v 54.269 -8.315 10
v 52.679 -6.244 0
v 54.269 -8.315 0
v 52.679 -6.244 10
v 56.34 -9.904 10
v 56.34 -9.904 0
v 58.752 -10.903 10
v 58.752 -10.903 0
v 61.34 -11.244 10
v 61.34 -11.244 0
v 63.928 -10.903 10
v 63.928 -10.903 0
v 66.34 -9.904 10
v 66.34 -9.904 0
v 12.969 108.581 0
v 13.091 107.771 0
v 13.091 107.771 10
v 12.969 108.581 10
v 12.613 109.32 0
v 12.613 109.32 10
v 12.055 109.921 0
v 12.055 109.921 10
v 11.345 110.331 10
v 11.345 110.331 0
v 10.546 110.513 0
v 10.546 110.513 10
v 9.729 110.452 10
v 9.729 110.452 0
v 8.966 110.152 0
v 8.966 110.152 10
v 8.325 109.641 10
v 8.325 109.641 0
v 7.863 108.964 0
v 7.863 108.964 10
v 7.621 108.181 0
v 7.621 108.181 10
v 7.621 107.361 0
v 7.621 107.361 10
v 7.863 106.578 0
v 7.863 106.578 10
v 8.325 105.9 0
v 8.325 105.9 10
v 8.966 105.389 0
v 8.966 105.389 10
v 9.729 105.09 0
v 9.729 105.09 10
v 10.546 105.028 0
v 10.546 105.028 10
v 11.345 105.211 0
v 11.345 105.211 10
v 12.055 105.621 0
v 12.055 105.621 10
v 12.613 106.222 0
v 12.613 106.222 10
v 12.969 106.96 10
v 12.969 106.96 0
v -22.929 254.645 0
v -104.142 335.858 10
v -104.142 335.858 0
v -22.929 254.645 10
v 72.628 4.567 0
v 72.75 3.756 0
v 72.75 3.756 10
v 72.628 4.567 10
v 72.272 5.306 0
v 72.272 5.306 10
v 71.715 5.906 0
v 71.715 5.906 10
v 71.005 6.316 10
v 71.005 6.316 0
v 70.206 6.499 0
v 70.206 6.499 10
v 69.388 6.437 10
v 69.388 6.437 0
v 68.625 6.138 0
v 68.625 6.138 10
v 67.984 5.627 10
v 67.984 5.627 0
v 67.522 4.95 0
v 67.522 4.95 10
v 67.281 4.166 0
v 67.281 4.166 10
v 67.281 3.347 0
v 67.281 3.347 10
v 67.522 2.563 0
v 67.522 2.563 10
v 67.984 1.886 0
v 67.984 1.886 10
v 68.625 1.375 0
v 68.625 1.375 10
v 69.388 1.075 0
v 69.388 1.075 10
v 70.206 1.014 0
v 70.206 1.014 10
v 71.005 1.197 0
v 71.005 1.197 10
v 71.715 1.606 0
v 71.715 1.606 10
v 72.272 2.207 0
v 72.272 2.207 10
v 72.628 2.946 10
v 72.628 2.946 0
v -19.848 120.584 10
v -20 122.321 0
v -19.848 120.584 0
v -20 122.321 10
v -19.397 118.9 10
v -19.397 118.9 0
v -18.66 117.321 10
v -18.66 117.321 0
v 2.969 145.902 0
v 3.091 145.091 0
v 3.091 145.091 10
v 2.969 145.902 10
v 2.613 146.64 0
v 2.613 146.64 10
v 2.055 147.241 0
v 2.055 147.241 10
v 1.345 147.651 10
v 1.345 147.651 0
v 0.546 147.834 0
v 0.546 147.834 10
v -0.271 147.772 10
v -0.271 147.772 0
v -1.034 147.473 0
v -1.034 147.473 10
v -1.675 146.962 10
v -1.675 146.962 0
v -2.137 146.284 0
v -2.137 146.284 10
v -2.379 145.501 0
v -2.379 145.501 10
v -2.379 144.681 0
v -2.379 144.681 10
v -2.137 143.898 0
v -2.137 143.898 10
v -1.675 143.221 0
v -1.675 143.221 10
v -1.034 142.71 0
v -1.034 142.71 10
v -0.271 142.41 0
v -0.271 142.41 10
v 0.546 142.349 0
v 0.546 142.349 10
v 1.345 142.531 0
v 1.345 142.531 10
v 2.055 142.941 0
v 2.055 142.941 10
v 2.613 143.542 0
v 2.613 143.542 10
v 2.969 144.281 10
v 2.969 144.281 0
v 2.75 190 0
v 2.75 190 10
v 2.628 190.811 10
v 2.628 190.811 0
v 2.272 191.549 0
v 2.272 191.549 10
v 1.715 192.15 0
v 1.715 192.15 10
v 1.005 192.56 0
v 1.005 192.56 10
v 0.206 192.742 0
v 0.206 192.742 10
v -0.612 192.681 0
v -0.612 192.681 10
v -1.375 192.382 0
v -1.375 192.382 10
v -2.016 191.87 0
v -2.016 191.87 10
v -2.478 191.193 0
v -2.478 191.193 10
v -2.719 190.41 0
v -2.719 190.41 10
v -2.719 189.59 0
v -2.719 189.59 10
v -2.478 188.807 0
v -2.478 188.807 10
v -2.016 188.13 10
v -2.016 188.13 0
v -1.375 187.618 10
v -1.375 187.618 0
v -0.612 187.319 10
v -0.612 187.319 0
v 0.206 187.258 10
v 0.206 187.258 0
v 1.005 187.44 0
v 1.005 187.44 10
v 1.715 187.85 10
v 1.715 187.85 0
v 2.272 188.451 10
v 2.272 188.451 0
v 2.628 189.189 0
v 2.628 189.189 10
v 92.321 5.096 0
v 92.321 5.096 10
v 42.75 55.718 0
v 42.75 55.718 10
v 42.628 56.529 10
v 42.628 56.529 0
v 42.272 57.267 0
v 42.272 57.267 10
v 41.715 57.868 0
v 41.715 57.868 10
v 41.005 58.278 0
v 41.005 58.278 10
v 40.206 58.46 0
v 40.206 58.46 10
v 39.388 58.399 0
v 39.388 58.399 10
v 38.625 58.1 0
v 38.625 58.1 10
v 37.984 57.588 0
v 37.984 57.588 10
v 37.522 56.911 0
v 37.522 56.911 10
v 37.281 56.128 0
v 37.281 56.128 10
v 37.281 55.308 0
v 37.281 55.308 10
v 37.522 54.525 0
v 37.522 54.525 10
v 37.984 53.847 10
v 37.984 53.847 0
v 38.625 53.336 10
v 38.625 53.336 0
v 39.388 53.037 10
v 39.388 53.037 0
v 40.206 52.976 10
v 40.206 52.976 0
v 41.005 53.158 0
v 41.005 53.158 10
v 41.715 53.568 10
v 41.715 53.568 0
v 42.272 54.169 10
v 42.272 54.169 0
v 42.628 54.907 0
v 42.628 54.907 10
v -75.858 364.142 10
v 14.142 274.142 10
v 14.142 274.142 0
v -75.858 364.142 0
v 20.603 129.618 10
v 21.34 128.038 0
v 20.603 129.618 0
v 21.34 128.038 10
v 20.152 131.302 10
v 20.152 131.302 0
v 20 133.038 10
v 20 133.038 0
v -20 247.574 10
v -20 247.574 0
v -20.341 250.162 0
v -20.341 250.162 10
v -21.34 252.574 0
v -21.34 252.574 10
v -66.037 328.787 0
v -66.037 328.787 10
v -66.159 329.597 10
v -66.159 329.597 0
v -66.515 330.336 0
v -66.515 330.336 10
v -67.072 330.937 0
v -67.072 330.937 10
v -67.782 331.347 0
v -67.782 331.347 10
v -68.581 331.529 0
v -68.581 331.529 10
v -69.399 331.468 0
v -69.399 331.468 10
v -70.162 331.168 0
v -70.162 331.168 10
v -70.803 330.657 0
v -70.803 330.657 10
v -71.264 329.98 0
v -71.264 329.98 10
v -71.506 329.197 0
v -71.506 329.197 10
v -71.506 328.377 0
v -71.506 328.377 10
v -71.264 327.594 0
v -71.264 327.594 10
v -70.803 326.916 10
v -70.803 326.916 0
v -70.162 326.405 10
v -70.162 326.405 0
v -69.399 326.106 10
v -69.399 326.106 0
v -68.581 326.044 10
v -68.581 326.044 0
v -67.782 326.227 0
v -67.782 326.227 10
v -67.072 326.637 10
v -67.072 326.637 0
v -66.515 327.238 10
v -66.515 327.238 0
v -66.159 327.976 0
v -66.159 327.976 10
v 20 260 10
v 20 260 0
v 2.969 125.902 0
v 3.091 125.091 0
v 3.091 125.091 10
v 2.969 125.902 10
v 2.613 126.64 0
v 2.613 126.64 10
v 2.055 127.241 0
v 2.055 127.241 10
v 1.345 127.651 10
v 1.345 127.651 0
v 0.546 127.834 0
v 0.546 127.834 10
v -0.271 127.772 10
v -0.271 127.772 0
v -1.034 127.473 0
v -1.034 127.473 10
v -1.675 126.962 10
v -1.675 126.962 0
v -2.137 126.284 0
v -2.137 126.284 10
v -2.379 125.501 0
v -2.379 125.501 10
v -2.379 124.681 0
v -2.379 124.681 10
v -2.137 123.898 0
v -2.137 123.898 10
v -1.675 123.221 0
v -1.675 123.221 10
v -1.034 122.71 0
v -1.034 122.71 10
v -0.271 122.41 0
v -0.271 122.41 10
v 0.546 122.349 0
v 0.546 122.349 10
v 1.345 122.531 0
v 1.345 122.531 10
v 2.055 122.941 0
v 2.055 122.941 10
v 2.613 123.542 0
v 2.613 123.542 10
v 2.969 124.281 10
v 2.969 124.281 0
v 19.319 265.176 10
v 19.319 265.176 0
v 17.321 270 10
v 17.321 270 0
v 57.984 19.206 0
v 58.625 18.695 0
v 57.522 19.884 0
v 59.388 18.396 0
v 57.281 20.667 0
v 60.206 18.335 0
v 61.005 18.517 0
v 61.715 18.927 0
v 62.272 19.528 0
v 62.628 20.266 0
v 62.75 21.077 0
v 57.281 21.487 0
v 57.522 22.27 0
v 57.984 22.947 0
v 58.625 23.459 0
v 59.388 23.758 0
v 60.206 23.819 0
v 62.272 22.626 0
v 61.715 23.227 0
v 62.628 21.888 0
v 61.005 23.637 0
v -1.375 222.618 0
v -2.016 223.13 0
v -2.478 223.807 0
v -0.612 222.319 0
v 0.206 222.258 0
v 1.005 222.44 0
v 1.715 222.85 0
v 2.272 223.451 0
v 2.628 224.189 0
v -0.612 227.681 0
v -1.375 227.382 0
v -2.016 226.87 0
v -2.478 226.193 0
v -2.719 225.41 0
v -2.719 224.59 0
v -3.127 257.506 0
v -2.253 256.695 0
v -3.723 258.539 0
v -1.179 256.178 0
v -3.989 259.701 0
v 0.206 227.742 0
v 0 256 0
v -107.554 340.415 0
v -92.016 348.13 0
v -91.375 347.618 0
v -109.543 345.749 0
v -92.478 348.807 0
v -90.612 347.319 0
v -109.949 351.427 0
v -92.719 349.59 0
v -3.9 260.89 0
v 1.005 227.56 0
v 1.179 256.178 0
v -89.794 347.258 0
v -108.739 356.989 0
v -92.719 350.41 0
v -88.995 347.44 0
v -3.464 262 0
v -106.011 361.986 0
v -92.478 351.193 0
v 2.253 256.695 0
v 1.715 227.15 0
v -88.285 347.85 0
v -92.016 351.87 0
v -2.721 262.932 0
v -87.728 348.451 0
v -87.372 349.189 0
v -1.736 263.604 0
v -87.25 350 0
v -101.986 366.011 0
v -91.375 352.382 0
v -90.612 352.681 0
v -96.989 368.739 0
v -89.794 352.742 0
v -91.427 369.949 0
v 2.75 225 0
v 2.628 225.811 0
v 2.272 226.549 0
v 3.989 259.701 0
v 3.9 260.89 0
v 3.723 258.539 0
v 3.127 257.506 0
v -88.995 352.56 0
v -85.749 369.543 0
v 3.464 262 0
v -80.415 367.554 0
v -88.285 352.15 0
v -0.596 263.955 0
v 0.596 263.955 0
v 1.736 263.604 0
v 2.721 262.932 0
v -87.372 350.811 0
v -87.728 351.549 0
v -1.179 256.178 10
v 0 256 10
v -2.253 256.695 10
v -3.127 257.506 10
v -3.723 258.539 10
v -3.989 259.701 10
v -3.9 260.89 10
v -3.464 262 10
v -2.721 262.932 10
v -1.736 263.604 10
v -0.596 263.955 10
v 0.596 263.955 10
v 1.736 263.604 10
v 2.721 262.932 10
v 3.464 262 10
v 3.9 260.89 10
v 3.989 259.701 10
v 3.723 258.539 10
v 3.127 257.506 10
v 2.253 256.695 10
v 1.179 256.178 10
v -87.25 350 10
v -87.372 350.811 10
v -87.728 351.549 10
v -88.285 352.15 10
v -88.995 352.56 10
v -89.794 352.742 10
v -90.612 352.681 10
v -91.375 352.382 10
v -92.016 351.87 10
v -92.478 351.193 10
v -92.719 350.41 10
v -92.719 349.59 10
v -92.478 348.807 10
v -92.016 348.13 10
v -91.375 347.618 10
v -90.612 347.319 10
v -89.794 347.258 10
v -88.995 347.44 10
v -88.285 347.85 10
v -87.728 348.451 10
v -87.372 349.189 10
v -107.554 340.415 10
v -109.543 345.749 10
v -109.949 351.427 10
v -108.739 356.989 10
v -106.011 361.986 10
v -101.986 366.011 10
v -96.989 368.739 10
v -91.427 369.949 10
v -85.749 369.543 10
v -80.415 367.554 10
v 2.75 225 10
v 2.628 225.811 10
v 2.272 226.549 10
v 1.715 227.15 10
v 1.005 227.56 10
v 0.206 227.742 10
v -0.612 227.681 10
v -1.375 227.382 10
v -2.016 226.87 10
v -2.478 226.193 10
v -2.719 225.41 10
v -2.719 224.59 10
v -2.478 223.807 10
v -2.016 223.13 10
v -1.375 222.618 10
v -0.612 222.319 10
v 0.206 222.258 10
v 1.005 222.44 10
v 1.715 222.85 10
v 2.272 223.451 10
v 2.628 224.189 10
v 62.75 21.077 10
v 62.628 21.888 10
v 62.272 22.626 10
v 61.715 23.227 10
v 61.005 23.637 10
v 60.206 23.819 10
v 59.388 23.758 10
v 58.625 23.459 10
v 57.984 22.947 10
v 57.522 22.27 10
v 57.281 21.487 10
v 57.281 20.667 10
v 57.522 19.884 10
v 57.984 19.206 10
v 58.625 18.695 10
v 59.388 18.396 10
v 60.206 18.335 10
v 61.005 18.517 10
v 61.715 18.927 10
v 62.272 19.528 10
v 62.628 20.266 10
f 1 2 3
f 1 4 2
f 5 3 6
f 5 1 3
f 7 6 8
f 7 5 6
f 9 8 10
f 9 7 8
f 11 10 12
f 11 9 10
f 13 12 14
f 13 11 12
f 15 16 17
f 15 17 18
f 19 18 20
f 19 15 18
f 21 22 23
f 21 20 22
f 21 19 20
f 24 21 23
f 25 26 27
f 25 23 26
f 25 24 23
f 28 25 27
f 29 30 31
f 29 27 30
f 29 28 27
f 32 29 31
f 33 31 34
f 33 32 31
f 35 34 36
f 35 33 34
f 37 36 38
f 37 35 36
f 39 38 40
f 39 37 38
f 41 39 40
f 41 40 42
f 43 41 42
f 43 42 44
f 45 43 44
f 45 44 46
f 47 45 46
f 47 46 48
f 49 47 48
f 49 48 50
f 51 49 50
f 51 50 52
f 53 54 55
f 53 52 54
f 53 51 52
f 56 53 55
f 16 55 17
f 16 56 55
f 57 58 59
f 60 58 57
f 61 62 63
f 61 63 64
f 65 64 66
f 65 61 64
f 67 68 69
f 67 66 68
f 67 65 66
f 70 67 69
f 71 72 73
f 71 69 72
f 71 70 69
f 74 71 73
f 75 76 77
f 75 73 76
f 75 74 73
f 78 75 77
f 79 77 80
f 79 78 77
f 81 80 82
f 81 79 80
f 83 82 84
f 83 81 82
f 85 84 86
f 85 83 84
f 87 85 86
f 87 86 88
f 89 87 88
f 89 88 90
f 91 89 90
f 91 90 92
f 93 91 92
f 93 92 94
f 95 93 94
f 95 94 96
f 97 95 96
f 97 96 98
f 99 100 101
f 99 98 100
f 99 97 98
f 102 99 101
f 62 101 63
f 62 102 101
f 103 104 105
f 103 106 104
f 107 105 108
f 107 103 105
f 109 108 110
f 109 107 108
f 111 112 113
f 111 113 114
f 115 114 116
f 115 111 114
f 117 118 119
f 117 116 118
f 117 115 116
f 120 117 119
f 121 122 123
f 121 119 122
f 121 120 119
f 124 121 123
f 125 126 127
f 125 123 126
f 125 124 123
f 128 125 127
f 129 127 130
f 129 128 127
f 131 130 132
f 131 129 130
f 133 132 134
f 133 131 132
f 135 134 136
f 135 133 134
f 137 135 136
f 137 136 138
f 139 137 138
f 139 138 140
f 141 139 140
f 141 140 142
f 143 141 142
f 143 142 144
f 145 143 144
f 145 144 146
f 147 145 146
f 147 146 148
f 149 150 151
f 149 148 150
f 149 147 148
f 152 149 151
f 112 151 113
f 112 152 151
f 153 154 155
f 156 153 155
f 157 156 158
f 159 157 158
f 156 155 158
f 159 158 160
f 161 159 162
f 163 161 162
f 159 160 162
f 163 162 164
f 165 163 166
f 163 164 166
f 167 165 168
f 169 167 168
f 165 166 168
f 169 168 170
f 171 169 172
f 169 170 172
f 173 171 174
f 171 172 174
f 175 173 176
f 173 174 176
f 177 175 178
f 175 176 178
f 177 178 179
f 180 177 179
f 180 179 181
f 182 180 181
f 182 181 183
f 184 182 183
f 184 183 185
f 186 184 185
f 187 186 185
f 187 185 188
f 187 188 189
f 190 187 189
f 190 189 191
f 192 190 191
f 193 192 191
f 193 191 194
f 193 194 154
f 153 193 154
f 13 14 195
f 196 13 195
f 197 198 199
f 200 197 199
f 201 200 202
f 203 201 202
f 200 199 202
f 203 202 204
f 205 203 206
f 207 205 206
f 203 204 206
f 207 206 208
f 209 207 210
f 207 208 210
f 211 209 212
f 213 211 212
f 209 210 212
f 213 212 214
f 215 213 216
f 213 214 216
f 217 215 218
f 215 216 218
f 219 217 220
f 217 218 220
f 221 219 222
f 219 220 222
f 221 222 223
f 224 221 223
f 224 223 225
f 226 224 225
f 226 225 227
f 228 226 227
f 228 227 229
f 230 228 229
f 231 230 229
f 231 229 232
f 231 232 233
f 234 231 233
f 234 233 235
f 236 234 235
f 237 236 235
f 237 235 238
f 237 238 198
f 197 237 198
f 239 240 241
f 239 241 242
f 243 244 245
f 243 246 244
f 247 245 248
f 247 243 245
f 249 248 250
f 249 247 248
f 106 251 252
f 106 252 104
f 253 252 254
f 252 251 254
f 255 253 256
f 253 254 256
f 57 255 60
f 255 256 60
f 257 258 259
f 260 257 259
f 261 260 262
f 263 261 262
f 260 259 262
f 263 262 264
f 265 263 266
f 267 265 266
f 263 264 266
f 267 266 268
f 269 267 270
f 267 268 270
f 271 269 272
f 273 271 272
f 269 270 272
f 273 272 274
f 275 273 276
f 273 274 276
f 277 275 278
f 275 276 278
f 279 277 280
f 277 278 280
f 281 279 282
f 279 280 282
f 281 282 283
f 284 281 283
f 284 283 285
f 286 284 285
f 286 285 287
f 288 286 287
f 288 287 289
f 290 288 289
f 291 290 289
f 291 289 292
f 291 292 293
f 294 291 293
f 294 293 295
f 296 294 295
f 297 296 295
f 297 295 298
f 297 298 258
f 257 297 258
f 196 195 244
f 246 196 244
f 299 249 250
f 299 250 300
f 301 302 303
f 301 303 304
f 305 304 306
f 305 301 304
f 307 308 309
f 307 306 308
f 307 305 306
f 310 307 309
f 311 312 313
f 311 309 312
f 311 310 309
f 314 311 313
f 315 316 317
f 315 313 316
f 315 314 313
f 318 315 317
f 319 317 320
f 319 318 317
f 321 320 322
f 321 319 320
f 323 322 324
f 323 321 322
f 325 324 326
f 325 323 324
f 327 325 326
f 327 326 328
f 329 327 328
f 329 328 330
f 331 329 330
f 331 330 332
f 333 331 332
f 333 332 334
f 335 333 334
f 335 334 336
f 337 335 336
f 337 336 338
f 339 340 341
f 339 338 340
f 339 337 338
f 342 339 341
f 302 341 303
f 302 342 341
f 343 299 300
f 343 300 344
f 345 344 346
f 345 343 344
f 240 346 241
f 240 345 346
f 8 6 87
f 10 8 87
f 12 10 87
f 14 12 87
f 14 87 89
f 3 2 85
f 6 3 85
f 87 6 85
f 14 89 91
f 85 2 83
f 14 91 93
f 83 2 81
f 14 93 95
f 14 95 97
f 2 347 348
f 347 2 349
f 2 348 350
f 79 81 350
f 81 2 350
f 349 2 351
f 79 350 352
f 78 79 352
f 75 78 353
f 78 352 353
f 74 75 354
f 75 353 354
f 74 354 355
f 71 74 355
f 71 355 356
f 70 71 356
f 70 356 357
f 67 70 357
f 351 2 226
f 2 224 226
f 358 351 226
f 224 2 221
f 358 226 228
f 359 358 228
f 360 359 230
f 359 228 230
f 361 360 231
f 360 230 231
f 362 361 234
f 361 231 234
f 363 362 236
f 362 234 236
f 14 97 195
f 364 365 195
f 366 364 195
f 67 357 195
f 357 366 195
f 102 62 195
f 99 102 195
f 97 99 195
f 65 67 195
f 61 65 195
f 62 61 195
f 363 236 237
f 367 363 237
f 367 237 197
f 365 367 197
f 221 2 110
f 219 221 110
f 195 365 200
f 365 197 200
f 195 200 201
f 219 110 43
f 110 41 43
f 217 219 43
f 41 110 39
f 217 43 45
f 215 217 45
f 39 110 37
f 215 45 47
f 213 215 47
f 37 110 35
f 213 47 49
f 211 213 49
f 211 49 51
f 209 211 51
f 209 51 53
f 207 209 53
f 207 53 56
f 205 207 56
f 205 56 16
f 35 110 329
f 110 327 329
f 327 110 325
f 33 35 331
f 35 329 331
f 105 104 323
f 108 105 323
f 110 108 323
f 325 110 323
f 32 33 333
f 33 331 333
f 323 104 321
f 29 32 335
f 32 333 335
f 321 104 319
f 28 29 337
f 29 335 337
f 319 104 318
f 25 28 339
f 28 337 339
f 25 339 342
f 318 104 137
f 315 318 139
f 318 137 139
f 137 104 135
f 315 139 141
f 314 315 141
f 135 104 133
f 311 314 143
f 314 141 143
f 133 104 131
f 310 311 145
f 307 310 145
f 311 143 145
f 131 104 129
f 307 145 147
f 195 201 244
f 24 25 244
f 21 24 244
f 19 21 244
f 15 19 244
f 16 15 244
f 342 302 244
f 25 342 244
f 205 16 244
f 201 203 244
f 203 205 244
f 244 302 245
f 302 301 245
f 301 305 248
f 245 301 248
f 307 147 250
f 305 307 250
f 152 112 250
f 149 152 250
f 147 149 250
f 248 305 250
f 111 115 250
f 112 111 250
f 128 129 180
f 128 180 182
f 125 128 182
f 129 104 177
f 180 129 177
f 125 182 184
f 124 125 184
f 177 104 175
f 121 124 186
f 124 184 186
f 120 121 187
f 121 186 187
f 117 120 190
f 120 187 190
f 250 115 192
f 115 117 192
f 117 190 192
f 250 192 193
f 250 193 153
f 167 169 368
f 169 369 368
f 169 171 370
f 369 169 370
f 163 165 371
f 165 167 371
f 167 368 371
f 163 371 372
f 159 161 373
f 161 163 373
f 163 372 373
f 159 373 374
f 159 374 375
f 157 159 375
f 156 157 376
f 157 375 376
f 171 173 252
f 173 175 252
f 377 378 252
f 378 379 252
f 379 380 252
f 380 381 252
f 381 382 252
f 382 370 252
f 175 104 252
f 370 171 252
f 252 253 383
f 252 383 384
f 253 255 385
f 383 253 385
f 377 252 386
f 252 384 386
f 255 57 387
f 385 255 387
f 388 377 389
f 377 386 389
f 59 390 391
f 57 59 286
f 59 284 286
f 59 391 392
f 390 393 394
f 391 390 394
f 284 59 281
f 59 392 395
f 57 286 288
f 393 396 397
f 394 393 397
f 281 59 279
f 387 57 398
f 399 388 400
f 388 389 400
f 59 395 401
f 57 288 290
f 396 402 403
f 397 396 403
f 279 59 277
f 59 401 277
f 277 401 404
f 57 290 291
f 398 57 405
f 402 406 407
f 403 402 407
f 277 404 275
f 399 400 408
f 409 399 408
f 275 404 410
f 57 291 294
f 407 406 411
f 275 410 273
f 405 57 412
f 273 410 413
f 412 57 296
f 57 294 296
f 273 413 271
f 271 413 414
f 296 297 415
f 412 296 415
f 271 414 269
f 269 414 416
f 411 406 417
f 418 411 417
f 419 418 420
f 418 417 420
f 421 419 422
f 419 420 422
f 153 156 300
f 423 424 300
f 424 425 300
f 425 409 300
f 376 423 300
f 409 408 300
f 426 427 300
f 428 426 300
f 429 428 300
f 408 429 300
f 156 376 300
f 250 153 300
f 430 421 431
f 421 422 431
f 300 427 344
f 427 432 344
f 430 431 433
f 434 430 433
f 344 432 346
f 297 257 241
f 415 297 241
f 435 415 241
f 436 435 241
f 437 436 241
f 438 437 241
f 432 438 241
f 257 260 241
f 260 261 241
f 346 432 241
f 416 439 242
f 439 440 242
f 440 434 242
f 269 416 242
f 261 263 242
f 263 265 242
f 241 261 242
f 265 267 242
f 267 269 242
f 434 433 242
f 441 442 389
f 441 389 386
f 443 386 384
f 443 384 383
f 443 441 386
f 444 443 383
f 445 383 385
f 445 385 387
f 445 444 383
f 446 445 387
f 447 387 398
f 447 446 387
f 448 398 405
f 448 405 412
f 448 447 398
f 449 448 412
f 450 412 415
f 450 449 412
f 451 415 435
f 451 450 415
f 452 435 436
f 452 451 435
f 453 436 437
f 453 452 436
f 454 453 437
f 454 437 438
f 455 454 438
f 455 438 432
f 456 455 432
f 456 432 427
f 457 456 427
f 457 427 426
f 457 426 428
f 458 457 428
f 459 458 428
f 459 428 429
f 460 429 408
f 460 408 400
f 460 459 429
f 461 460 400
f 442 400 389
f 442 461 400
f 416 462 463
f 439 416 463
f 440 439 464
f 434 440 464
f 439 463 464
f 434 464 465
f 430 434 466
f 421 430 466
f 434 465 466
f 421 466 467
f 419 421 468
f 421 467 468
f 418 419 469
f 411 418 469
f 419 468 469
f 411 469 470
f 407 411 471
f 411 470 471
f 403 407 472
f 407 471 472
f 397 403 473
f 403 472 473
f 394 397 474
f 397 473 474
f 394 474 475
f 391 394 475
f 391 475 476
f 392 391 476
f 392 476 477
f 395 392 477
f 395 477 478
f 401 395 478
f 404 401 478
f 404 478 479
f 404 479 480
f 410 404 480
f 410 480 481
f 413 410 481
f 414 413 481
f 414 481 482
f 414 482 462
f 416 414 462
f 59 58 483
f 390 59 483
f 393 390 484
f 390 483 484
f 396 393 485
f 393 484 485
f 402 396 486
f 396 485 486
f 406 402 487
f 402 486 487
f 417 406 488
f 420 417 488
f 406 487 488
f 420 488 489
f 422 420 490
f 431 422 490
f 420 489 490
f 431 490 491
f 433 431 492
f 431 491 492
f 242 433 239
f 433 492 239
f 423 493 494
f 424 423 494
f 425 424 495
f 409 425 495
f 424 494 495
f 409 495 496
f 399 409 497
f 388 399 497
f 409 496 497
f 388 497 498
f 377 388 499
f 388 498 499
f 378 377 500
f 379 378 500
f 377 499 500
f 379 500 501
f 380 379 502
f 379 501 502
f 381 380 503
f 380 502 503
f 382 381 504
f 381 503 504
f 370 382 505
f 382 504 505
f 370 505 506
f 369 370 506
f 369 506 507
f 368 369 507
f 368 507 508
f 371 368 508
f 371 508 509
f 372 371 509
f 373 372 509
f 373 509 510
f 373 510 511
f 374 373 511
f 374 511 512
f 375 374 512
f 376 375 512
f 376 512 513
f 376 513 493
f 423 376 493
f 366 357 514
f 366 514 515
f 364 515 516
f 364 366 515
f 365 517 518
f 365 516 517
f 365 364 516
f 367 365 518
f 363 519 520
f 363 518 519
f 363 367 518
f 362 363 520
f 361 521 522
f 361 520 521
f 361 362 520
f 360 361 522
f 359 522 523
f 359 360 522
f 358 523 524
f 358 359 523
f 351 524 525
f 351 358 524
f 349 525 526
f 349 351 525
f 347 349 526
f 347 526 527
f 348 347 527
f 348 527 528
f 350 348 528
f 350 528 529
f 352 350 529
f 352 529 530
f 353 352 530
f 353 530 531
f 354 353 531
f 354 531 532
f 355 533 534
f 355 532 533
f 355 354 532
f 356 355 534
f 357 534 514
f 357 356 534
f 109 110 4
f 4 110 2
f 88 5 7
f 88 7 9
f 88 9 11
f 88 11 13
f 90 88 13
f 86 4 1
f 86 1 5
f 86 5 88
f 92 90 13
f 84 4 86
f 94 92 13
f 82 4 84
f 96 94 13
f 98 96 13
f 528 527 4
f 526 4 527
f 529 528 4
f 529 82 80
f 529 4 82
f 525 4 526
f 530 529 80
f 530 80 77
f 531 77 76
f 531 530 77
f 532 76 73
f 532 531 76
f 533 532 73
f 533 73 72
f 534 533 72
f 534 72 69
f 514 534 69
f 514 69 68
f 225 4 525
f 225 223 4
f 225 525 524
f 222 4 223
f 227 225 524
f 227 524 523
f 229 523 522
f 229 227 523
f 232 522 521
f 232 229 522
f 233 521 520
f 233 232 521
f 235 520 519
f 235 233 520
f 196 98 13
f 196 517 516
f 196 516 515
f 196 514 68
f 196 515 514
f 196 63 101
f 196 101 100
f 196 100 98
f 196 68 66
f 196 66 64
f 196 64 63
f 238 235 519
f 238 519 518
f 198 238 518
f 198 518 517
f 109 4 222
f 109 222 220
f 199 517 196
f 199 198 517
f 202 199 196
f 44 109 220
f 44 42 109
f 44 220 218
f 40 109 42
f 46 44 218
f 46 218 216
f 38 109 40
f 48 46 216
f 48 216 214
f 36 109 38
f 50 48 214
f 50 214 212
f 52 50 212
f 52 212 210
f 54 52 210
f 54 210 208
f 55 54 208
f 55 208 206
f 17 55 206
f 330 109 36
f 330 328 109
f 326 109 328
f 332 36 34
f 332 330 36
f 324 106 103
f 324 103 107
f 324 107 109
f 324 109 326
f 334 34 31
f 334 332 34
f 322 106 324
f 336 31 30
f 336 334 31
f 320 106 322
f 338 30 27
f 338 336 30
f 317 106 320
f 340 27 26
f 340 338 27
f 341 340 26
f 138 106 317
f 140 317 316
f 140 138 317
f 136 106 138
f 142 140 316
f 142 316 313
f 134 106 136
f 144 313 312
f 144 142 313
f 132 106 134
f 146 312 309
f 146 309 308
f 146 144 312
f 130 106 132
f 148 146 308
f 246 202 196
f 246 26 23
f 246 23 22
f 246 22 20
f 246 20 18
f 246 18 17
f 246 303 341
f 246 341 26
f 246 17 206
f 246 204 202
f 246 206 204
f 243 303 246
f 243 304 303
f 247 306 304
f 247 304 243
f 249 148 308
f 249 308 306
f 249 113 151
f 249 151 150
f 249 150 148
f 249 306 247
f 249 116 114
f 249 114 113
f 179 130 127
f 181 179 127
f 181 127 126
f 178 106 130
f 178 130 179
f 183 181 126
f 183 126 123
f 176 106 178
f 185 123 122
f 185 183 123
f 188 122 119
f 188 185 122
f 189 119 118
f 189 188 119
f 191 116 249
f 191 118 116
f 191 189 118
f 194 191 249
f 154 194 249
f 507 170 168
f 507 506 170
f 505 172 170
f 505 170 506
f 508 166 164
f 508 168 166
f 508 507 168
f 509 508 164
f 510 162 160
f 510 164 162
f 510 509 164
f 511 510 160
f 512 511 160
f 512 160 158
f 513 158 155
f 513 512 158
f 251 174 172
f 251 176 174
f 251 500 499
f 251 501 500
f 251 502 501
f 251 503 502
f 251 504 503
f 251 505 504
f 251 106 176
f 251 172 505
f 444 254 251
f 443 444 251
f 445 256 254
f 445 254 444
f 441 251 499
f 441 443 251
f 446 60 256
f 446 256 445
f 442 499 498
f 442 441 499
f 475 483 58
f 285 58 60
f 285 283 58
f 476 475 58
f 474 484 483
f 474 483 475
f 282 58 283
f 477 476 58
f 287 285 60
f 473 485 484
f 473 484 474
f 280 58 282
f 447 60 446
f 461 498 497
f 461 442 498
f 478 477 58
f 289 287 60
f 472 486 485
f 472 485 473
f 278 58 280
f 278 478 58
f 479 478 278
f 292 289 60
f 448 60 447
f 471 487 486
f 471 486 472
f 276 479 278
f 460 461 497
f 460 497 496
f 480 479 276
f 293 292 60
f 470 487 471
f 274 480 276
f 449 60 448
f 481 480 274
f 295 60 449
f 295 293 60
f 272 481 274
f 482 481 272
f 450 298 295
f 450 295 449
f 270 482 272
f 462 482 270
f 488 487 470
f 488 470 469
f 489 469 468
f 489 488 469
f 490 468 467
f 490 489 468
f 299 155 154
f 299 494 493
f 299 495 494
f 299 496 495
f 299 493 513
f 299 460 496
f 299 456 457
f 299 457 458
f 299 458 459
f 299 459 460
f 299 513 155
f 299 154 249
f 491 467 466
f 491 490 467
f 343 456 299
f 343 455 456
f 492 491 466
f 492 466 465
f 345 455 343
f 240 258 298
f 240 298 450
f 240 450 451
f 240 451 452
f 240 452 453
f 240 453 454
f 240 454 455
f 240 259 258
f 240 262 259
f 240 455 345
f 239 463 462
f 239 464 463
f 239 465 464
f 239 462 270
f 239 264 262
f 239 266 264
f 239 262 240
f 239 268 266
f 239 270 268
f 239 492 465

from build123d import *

# Parameters (mm, degrees)
BOSS_EXTRUDE1_DEPTH     = 10
FILLET1_R               = 10
BOSS_EXTRUDE2_DEPTH     = 10
SKETCH3_R               = 2.75
CUT_EXTRUDE1_DEPTH      = 295.996739323
CUT_EXTRUDE2_DEPTH      = 295.996739323
CUT_EXTRUDE2_DEPTH_BACK = 295.996739323
SKETCH5_R               = 2.75
BOSS_EXTRUDE3_DEPTH     = 10
FILLET2_R               = 10
CUT_EXTRUDE3_DEPTH      = 10
SKETCH9_R               = 2.75
CUT_EXTRUDE4_DEPTH      = 387.134691526
SKETCH10_R              = 2.75
CUT_EXTRUDE5_DEPTH      = 387.134691526
CUT_EXTRUDE6_DEPTH      = 387.134691526
CUT_EXTRUDE6_DEPTH_BACK = 387.134691526
SKETCH11_R              = 2.75


with BuildPart() as part:
    # Sketch1 → Boss-Extrude1 (new body)
    with BuildSketch(Plane.XY):
        Polygon((75, -4.903810568), (0, 125), (0, 250), (-20, 250), (-20, 119.641016151), (57.679491924, -14.903810568), align=None)
        Polygon((0, 250), (0, 125), (75, -4.903810568), (92.320508076, 5.096189432), (20, 130.358983849), (20, 250), align=None)
    extrude(amount=BOSS_EXTRUDE1_DEPTH)

    # Fillet1
    fillet1_edges = [part.edges().sort_by_distance(p)[0] for p in [
        (57.679491924, -14.903810568, 5),
        (-20, 119.641016151, 5),
        (20, 130.358983849, 5),
    ]]
    fillet(fillet1_edges, radius=FILLET1_R)

    # Sketch2 → Boss-Extrude2 (add)
    with BuildSketch(Plane.XY.offset(10)):
        with BuildLine():
            Line((0, 250), (20, 250))
            Line((20, 250), (20, 260))
            ThreePointArc((20, 260), (0, 280), (-20, 260))
            Line((-20, 260), (-20, 250))
            Line((-20, 250), (0, 250))
        make_face()
        with BuildLine():
            ThreePointArc((0, 264), (4, 260), (0, 256))
            ThreePointArc((0, 256), (-4, 260), (0, 264))
        make_face(mode=Mode.SUBTRACT)
    extrude(amount=-BOSS_EXTRUDE2_DEPTH)

    # Sketch3 → Cut-Extrude1 (cut, through all)
    with BuildSketch(Plane.XY.offset(10)):
        with Locations((0, 190)):
            Circle(SKETCH3_R)
        with Locations((0, 225)):
            Circle(SKETCH3_R)
    extrude(amount=-CUT_EXTRUDE1_DEPTH, mode=Mode.SUBTRACT)

    # Sketch5 → Cut-Extrude2 (cut, two sides: drawn at the far end of the back side and taken through both)
    with BuildSketch(Plane.XY.offset(10).offset(-CUT_EXTRUDE2_DEPTH_BACK)):
        with Locations((60, 21.076951546)):
            Circle(SKETCH5_R)
        with Locations((70, 3.75644347)):
            Circle(SKETCH5_R)
    extrude(amount=CUT_EXTRUDE2_DEPTH + CUT_EXTRUDE2_DEPTH_BACK, mode=Mode.SUBTRACT)

    # Sketch7 → Boss-Extrude3 (add)
    with BuildSketch(Plane.XY.offset(10)):
        with BuildLine():
            ThreePointArc((-14.142135624, 245.857864376), (-14.142135624, 274.142135624), (14.142135624, 274.142135624))
            Line((14.142135624, 274.142135624), (-105.857864376, 394.142135624))
            ThreePointArc((-105.857864376, 394.142135624), (-134.142135624, 394.142135624), (-134.142135624, 365.857864376))
            Line((-134.142135624, 365.857864376), (-14.142135624, 245.857864376))
        make_face()
    extrude(amount=-BOSS_EXTRUDE3_DEPTH)

    # Fillet2
    fillet2_edges = [part.edges().sort_by_distance(p)[0] for p in [
        (-20, 251.715728753, 5),
    ]]
    fillet(fillet2_edges, radius=FILLET2_R)

    # Sketch8 → Cut-Extrude3 (cut)
    with BuildSketch(Plane.XY.offset(10)):
        with BuildLine():
            ThreePointArc((-104.142135624, 335.857864376), (-104.142135624, 364.142135624), (-75.857864376, 364.142135624))
            Line((-75.857864376, 364.142135624), (-105.857864376, 394.142135624))
            ThreePointArc((-105.857864376, 394.142135624), (-134.142135624, 394.142135624), (-134.142135624, 365.857864376))
            Line((-134.142135624, 365.857864376), (-104.142135624, 335.857864376))
        make_face()
    extrude(amount=-CUT_EXTRUDE3_DEPTH, mode=Mode.SUBTRACT)

    # Sketch9 → Cut-Extrude4 (cut, through all)
    with BuildSketch(Plane.XY.offset(10)):
        with Locations((-90, 350)):
            Circle(SKETCH9_R)
        with Locations((-68.786796564, 328.786796564)):
            Circle(SKETCH9_R)
    extrude(amount=-CUT_EXTRUDE4_DEPTH, mode=Mode.SUBTRACT)

    # Sketch10 → Cut-Extrude5 (cut, through all)
    with BuildSketch(Plane.XY.offset(10)):
        with Locations((40, 55.717967697)):
            Circle(SKETCH10_R)
    extrude(amount=-CUT_EXTRUDE5_DEPTH, mode=Mode.SUBTRACT)

    # Sketch11 → Cut-Extrude6 (cut, two sides: drawn at the far end of the back side and taken through both)
    with BuildSketch(Plane.XY.offset(10).offset(-CUT_EXTRUDE6_DEPTH_BACK)):
        with Locations((0.340741737, 145.091301473)):
            Circle(SKETCH11_R)
        with Locations((0.340741737, 125.091301473)):
            Circle(SKETCH11_R)
        with Locations((10.340741737, 107.770793398)):
            Circle(SKETCH11_R)
    extrude(amount=CUT_EXTRUDE6_DEPTH + CUT_EXTRUDE6_DEPTH_BACK, mode=Mode.SUBTRACT)


solid = part.part
